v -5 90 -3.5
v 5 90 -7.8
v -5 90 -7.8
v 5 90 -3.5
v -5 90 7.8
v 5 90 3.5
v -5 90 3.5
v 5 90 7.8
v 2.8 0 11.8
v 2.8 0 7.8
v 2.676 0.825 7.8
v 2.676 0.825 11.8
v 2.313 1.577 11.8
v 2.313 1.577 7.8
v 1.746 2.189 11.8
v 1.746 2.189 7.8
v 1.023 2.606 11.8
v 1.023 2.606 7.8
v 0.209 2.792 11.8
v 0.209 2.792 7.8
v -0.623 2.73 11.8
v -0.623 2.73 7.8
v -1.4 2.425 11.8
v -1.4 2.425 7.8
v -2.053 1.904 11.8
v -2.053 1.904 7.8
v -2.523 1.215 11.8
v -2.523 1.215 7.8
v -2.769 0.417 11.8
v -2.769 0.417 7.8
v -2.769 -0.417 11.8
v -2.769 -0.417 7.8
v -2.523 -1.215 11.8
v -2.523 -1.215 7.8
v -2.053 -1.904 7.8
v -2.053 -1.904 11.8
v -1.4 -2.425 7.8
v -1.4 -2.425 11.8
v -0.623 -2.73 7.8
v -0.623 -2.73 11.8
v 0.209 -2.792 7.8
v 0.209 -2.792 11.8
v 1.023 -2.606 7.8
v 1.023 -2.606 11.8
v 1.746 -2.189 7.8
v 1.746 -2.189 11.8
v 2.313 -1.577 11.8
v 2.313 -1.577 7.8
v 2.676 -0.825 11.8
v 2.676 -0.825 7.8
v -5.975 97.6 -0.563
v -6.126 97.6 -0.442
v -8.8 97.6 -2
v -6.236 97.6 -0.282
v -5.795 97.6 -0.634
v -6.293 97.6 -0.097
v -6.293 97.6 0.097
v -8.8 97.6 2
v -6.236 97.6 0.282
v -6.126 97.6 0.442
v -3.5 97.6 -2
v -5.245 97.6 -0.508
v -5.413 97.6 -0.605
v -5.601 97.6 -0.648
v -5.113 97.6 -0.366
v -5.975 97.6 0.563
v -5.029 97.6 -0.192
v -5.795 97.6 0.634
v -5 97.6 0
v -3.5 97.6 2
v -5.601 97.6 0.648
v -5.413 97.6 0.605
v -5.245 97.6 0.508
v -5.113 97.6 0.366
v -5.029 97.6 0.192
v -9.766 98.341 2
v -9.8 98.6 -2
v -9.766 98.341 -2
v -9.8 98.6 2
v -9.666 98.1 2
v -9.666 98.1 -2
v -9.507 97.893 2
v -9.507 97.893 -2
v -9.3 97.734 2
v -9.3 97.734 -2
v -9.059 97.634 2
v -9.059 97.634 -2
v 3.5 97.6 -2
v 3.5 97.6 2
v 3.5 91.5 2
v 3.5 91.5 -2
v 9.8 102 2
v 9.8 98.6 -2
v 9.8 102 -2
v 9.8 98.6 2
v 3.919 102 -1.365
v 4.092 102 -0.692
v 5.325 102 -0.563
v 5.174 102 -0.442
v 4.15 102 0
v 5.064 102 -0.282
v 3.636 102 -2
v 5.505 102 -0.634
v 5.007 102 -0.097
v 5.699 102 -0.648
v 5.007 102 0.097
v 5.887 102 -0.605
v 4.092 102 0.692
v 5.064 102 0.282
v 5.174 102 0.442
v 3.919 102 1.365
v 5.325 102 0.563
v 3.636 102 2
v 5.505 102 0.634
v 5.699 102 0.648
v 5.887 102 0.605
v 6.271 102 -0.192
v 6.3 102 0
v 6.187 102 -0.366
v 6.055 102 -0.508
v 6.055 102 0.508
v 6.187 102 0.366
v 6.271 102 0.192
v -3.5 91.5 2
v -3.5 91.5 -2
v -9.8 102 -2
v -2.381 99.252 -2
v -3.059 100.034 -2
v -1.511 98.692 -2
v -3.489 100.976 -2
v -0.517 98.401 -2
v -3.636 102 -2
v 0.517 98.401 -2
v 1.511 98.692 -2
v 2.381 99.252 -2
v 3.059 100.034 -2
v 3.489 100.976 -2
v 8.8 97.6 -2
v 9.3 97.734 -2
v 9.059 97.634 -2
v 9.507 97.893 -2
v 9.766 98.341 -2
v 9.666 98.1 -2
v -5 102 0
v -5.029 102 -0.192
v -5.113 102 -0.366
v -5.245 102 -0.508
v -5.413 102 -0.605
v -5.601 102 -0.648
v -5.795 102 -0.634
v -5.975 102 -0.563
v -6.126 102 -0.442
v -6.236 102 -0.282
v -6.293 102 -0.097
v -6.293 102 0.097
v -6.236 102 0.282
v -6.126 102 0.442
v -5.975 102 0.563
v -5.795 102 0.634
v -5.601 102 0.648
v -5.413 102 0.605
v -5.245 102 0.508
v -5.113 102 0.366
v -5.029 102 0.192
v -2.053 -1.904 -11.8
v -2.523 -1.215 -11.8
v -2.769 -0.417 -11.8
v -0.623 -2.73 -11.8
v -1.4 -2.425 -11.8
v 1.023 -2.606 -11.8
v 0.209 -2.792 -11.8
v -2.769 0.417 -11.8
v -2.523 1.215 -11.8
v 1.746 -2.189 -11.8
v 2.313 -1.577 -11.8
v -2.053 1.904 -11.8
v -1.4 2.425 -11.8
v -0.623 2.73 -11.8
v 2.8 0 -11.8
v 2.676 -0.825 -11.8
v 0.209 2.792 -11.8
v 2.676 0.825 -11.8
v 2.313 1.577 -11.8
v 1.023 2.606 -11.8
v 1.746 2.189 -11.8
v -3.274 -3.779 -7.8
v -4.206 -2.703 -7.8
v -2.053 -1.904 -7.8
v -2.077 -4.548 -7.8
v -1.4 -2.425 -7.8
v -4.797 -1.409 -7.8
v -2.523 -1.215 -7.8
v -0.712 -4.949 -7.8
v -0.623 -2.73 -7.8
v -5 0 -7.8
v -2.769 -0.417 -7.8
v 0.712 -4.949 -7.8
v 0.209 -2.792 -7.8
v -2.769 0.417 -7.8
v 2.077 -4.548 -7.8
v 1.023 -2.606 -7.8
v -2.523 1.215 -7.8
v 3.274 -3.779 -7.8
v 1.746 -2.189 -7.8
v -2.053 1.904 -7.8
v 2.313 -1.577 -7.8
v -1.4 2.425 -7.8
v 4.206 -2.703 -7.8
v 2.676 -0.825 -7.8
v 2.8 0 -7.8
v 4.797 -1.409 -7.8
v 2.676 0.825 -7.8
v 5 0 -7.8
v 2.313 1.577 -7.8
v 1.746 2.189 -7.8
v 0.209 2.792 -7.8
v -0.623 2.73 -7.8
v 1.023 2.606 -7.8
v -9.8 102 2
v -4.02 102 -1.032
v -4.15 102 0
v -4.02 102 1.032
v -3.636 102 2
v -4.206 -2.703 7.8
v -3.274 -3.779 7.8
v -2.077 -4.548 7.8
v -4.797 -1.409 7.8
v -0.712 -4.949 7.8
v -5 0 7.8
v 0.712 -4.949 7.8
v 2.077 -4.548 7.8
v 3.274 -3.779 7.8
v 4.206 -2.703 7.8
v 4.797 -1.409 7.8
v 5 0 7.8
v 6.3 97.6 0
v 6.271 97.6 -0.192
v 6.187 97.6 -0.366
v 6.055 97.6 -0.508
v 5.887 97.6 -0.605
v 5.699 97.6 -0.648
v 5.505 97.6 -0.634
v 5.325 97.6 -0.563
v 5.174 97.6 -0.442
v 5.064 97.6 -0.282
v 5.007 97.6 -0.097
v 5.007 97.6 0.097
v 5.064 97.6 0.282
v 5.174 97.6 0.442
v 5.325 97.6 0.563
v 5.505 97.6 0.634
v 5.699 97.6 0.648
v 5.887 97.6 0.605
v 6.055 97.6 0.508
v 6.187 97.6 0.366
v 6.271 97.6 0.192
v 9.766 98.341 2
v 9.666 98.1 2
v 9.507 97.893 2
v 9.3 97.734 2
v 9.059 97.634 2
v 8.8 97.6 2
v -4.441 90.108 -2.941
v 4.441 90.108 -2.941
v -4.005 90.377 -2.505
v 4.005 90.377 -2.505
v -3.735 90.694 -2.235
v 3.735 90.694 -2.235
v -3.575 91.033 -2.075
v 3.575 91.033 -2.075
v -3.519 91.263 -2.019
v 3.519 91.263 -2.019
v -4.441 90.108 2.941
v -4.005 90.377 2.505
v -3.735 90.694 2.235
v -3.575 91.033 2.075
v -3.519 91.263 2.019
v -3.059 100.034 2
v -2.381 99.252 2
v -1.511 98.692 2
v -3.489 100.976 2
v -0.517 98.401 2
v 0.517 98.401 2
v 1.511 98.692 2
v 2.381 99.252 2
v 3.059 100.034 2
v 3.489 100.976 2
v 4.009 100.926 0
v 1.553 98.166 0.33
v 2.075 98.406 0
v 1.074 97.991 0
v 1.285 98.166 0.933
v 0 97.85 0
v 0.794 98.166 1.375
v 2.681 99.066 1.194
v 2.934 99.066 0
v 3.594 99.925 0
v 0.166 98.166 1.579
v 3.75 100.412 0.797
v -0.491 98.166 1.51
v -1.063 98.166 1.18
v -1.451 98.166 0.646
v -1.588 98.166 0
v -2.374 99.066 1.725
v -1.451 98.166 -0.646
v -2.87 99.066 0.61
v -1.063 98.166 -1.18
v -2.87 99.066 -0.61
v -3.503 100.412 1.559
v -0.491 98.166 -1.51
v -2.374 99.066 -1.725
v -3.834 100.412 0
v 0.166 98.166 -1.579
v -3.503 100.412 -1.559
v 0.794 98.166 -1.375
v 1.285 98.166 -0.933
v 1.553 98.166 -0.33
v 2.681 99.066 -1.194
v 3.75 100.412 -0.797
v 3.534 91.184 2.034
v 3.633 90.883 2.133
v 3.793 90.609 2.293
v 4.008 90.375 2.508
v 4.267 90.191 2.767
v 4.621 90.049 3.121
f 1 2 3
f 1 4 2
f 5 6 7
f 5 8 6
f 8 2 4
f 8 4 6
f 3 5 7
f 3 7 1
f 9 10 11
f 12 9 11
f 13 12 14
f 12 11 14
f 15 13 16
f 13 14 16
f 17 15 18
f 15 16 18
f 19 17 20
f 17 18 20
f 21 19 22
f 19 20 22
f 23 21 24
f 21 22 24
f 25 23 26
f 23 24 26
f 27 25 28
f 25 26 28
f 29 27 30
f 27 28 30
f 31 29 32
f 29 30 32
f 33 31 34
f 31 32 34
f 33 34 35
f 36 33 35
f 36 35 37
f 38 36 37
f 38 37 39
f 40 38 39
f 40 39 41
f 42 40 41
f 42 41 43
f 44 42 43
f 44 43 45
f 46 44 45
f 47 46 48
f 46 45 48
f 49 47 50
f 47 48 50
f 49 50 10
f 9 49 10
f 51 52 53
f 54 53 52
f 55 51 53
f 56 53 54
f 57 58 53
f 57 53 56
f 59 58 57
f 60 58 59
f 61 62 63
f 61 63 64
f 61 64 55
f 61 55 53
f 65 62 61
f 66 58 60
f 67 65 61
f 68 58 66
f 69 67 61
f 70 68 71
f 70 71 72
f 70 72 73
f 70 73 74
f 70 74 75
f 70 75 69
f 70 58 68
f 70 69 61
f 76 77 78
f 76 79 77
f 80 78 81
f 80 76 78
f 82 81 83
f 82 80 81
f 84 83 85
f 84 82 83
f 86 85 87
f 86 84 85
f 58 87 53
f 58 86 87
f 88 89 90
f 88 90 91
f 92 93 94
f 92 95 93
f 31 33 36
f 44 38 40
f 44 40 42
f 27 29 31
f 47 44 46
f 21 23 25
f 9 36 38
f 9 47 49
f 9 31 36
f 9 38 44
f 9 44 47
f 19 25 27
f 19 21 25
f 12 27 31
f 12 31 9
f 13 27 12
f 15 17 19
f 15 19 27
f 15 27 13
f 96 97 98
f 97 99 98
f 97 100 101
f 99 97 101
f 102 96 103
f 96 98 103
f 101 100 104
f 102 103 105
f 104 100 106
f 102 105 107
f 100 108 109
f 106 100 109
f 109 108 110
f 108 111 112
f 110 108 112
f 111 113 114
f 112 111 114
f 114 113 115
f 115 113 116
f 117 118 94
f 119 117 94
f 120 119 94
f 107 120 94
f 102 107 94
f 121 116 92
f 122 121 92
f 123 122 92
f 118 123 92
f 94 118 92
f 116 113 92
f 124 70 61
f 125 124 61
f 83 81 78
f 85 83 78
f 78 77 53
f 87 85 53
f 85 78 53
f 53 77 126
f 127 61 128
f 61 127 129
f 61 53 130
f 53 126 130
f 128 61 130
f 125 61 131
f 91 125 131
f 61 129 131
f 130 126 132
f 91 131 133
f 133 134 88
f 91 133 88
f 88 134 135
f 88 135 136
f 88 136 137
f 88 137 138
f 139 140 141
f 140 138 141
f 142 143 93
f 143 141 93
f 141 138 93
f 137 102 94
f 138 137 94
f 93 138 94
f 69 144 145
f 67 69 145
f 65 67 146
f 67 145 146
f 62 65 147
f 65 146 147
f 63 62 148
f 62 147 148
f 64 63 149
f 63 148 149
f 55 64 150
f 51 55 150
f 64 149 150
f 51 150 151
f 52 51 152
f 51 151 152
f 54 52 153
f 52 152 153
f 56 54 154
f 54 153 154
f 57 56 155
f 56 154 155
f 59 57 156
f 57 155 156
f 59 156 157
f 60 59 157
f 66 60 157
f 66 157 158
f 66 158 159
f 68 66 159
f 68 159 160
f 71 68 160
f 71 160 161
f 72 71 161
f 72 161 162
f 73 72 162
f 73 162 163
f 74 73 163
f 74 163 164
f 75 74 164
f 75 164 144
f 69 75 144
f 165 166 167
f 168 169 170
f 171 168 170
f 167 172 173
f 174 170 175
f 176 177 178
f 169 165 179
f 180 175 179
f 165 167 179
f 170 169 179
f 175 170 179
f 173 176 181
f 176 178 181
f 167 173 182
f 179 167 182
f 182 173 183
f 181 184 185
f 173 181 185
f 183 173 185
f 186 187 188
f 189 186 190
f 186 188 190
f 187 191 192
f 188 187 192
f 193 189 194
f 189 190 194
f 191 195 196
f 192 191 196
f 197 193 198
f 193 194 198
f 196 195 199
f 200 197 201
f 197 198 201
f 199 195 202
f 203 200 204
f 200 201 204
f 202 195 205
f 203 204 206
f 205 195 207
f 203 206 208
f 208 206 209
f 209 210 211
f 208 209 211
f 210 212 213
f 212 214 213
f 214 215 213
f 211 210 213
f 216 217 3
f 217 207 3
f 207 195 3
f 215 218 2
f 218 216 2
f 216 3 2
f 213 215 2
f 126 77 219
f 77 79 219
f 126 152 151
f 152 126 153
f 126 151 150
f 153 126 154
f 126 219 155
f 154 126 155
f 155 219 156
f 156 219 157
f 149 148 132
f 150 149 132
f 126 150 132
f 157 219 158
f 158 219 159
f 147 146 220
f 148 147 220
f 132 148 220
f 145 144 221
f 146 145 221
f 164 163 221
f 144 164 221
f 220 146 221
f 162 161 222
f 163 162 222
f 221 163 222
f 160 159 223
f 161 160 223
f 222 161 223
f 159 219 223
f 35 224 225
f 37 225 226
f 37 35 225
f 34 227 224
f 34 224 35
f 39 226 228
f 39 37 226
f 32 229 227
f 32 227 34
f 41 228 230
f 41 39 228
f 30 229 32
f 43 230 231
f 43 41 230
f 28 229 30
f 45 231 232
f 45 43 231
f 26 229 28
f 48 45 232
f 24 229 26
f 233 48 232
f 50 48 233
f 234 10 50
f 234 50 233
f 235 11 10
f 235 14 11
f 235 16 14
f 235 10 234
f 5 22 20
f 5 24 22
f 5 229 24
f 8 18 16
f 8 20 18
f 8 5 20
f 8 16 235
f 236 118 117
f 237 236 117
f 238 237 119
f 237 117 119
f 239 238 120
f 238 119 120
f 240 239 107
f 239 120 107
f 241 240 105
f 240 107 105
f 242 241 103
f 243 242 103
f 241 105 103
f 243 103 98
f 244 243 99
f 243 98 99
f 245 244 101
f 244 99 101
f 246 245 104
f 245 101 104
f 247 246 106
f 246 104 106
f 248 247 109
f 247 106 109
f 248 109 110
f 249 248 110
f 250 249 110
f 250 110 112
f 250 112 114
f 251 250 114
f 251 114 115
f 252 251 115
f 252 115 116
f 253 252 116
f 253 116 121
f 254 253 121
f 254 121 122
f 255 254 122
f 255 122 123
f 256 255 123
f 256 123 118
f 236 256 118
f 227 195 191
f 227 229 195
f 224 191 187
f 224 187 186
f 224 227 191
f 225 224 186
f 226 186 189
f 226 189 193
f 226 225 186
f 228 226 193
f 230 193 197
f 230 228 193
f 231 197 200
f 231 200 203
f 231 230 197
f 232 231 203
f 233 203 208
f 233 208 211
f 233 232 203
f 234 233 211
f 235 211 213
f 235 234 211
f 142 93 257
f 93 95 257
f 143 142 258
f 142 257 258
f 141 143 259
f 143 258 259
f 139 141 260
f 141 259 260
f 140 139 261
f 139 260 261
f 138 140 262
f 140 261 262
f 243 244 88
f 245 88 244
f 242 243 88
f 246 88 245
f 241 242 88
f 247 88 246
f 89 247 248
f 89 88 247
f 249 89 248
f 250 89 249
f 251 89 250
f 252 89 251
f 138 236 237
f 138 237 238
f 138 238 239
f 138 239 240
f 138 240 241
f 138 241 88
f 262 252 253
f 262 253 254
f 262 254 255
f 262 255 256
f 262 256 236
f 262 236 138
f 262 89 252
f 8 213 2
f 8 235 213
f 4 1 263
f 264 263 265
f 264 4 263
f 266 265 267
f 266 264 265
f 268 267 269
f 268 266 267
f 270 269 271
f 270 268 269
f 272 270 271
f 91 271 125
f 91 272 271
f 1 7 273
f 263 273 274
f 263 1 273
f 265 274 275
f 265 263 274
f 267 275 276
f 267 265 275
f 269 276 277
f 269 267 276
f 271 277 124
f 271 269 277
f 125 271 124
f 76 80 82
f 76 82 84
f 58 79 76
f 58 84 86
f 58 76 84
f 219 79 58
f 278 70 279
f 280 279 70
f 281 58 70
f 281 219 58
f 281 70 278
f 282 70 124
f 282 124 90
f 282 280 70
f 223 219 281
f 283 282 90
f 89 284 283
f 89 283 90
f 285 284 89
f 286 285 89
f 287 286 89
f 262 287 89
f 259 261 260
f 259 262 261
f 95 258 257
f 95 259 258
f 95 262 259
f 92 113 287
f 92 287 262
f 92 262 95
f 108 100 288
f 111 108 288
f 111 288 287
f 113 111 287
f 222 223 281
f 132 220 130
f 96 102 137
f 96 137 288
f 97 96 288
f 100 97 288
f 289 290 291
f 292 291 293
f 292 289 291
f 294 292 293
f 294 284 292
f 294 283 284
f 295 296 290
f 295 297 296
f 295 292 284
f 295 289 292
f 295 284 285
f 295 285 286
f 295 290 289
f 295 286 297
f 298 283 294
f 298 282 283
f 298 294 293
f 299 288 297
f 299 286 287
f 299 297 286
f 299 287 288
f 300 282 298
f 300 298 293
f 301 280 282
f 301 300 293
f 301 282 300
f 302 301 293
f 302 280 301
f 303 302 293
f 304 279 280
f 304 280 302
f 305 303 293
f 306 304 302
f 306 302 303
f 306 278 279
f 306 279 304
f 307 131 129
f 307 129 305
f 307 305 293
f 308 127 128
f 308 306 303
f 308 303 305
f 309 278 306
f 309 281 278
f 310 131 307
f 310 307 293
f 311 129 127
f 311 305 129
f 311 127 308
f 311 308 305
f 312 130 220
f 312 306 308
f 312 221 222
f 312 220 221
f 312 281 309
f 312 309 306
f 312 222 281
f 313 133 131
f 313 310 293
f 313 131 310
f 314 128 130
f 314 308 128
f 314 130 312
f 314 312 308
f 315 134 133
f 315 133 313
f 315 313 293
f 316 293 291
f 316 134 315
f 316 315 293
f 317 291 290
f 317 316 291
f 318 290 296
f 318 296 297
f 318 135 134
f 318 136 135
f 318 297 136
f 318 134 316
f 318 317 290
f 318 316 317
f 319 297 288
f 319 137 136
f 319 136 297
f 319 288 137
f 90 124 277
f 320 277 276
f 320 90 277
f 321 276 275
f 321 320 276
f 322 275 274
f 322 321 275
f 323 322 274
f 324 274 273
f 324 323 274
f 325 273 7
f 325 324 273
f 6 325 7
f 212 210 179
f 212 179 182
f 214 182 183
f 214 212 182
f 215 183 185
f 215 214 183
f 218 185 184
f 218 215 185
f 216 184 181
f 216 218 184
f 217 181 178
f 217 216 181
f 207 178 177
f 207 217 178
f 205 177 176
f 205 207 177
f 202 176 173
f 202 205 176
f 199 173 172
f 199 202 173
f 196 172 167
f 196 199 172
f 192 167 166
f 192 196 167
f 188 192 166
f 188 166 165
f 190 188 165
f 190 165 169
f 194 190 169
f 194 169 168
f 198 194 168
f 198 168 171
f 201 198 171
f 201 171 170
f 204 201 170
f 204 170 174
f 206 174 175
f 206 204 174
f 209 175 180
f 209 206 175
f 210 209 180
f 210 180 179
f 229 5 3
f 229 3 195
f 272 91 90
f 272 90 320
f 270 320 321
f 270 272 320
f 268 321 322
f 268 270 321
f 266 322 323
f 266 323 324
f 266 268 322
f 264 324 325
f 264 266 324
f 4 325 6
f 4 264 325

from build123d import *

# Parameters (mm, degrees)
EXTRUDE_1_DEPTH = 7.8
SKETCH_4_R      = 2.8
EXTRUDE_3_DEPTH = 4
SKETCH_5_W      = 7
SKETCH_5_H      = 4
EXTRUDE_4_DEPTH = 12
SKETCH_7_W      = 19.6
SKETCH_7_H      = 4.4
EXTRUDE_5_DEPTH = 2
FILLET_2_R      = 1
HOLE_WIZARD_1_D = 1.3
FILLET_3_R      = 1.5


with BuildPart() as part:
    # 草图1 → 凸台-拉伸1 (new, symmetric)
    with BuildSketch(Plane.XY):
        with BuildLine():
            Line((5, 0), (5, 90))
            Line((5, 90), (-5, 90))
            Line((-5, 90), (-5, 0))
            ThreePointArc((-5, 0), (0, -5), (5, 0))
        make_face()
    extrude(amount=EXTRUDE_1_DEPTH, both=True)

    # 草图4 → 凸台-拉伸3 (add)
    with BuildSketch(Plane.XY.offset(7.8)):
        Circle(SKETCH_4_R)
    extrude_3 = extrude(amount=EXTRUDE_3_DEPTH)

    # 草图5 → 凸台-拉伸4 (add)
    with BuildSketch(Plane(origin=(0, 102, 0), x_dir=(1, 0, 0), z_dir=(0, 1, 0))):
        Rectangle(SKETCH_5_W, SKETCH_5_H)
    extrude(amount=-EXTRUDE_4_DEPTH)

    # 草图7 → 凸台-拉伸5 (add, symmetric)
    with BuildSketch(Plane.XY):
        with Locations((0, 99.8)):
            Rectangle(SKETCH_7_W, SKETCH_7_H)
    extrude(amount=EXTRUDE_5_DEPTH, both=True)

    # 草图10 → 切除-旋转1 (revolve, cut)
    with BuildSketch(Plane.XY):
        with BuildLine():
            ThreePointArc((4.15, 102), (2.934493142, 104.934493142), (0, 106.15))
            Line((0, 106.15), (0, 102))
            Line((0, 102), (0, 97.85))
            ThreePointArc((0, 97.85), (2.934493142, 99.065506858), (4.15, 102))
        make_face()
    revolve(axis=Axis((0, 106.15, 0), (0, -1, 0)), mode=Mode.SUBTRACT)

    # 镜向2: 凸台-拉伸3 across plane
    add(extrude_3.mirror(Plane.XY))

    # 圆角2
    fillet_2_edges = [part.edges().sort_by_distance(p)[0] for p in [
        (-9.8, 97.6, 0),
        (9.8, 97.6, 0),
    ]]
    fillet(fillet_2_edges, radius=FILLET_2_R)

    # 孔1 (through all)
    with Locations(Plane(origin=(0, 97.6, 0), x_dir=(-1, 0, 0), z_dir=(0, -1, 0))):
        with Locations((5.65, 0), (-5.65, 0)):
            Hole(HOLE_WIZARD_1_D / 2)

    # 圆角3
    fillet_3_edges = [part.edges().sort_by_distance(p)[0] for p in [
        (0, 90, -2),
        (-3.5, 90, 0),
        (0, 90, 2),
        (3.5, 90, 0),
    ]]
    fillet(fillet_3_edges, radius=FILLET_3_R - 0.0001)  # a hair under: the kernel refuses the full size


solid = part.part
